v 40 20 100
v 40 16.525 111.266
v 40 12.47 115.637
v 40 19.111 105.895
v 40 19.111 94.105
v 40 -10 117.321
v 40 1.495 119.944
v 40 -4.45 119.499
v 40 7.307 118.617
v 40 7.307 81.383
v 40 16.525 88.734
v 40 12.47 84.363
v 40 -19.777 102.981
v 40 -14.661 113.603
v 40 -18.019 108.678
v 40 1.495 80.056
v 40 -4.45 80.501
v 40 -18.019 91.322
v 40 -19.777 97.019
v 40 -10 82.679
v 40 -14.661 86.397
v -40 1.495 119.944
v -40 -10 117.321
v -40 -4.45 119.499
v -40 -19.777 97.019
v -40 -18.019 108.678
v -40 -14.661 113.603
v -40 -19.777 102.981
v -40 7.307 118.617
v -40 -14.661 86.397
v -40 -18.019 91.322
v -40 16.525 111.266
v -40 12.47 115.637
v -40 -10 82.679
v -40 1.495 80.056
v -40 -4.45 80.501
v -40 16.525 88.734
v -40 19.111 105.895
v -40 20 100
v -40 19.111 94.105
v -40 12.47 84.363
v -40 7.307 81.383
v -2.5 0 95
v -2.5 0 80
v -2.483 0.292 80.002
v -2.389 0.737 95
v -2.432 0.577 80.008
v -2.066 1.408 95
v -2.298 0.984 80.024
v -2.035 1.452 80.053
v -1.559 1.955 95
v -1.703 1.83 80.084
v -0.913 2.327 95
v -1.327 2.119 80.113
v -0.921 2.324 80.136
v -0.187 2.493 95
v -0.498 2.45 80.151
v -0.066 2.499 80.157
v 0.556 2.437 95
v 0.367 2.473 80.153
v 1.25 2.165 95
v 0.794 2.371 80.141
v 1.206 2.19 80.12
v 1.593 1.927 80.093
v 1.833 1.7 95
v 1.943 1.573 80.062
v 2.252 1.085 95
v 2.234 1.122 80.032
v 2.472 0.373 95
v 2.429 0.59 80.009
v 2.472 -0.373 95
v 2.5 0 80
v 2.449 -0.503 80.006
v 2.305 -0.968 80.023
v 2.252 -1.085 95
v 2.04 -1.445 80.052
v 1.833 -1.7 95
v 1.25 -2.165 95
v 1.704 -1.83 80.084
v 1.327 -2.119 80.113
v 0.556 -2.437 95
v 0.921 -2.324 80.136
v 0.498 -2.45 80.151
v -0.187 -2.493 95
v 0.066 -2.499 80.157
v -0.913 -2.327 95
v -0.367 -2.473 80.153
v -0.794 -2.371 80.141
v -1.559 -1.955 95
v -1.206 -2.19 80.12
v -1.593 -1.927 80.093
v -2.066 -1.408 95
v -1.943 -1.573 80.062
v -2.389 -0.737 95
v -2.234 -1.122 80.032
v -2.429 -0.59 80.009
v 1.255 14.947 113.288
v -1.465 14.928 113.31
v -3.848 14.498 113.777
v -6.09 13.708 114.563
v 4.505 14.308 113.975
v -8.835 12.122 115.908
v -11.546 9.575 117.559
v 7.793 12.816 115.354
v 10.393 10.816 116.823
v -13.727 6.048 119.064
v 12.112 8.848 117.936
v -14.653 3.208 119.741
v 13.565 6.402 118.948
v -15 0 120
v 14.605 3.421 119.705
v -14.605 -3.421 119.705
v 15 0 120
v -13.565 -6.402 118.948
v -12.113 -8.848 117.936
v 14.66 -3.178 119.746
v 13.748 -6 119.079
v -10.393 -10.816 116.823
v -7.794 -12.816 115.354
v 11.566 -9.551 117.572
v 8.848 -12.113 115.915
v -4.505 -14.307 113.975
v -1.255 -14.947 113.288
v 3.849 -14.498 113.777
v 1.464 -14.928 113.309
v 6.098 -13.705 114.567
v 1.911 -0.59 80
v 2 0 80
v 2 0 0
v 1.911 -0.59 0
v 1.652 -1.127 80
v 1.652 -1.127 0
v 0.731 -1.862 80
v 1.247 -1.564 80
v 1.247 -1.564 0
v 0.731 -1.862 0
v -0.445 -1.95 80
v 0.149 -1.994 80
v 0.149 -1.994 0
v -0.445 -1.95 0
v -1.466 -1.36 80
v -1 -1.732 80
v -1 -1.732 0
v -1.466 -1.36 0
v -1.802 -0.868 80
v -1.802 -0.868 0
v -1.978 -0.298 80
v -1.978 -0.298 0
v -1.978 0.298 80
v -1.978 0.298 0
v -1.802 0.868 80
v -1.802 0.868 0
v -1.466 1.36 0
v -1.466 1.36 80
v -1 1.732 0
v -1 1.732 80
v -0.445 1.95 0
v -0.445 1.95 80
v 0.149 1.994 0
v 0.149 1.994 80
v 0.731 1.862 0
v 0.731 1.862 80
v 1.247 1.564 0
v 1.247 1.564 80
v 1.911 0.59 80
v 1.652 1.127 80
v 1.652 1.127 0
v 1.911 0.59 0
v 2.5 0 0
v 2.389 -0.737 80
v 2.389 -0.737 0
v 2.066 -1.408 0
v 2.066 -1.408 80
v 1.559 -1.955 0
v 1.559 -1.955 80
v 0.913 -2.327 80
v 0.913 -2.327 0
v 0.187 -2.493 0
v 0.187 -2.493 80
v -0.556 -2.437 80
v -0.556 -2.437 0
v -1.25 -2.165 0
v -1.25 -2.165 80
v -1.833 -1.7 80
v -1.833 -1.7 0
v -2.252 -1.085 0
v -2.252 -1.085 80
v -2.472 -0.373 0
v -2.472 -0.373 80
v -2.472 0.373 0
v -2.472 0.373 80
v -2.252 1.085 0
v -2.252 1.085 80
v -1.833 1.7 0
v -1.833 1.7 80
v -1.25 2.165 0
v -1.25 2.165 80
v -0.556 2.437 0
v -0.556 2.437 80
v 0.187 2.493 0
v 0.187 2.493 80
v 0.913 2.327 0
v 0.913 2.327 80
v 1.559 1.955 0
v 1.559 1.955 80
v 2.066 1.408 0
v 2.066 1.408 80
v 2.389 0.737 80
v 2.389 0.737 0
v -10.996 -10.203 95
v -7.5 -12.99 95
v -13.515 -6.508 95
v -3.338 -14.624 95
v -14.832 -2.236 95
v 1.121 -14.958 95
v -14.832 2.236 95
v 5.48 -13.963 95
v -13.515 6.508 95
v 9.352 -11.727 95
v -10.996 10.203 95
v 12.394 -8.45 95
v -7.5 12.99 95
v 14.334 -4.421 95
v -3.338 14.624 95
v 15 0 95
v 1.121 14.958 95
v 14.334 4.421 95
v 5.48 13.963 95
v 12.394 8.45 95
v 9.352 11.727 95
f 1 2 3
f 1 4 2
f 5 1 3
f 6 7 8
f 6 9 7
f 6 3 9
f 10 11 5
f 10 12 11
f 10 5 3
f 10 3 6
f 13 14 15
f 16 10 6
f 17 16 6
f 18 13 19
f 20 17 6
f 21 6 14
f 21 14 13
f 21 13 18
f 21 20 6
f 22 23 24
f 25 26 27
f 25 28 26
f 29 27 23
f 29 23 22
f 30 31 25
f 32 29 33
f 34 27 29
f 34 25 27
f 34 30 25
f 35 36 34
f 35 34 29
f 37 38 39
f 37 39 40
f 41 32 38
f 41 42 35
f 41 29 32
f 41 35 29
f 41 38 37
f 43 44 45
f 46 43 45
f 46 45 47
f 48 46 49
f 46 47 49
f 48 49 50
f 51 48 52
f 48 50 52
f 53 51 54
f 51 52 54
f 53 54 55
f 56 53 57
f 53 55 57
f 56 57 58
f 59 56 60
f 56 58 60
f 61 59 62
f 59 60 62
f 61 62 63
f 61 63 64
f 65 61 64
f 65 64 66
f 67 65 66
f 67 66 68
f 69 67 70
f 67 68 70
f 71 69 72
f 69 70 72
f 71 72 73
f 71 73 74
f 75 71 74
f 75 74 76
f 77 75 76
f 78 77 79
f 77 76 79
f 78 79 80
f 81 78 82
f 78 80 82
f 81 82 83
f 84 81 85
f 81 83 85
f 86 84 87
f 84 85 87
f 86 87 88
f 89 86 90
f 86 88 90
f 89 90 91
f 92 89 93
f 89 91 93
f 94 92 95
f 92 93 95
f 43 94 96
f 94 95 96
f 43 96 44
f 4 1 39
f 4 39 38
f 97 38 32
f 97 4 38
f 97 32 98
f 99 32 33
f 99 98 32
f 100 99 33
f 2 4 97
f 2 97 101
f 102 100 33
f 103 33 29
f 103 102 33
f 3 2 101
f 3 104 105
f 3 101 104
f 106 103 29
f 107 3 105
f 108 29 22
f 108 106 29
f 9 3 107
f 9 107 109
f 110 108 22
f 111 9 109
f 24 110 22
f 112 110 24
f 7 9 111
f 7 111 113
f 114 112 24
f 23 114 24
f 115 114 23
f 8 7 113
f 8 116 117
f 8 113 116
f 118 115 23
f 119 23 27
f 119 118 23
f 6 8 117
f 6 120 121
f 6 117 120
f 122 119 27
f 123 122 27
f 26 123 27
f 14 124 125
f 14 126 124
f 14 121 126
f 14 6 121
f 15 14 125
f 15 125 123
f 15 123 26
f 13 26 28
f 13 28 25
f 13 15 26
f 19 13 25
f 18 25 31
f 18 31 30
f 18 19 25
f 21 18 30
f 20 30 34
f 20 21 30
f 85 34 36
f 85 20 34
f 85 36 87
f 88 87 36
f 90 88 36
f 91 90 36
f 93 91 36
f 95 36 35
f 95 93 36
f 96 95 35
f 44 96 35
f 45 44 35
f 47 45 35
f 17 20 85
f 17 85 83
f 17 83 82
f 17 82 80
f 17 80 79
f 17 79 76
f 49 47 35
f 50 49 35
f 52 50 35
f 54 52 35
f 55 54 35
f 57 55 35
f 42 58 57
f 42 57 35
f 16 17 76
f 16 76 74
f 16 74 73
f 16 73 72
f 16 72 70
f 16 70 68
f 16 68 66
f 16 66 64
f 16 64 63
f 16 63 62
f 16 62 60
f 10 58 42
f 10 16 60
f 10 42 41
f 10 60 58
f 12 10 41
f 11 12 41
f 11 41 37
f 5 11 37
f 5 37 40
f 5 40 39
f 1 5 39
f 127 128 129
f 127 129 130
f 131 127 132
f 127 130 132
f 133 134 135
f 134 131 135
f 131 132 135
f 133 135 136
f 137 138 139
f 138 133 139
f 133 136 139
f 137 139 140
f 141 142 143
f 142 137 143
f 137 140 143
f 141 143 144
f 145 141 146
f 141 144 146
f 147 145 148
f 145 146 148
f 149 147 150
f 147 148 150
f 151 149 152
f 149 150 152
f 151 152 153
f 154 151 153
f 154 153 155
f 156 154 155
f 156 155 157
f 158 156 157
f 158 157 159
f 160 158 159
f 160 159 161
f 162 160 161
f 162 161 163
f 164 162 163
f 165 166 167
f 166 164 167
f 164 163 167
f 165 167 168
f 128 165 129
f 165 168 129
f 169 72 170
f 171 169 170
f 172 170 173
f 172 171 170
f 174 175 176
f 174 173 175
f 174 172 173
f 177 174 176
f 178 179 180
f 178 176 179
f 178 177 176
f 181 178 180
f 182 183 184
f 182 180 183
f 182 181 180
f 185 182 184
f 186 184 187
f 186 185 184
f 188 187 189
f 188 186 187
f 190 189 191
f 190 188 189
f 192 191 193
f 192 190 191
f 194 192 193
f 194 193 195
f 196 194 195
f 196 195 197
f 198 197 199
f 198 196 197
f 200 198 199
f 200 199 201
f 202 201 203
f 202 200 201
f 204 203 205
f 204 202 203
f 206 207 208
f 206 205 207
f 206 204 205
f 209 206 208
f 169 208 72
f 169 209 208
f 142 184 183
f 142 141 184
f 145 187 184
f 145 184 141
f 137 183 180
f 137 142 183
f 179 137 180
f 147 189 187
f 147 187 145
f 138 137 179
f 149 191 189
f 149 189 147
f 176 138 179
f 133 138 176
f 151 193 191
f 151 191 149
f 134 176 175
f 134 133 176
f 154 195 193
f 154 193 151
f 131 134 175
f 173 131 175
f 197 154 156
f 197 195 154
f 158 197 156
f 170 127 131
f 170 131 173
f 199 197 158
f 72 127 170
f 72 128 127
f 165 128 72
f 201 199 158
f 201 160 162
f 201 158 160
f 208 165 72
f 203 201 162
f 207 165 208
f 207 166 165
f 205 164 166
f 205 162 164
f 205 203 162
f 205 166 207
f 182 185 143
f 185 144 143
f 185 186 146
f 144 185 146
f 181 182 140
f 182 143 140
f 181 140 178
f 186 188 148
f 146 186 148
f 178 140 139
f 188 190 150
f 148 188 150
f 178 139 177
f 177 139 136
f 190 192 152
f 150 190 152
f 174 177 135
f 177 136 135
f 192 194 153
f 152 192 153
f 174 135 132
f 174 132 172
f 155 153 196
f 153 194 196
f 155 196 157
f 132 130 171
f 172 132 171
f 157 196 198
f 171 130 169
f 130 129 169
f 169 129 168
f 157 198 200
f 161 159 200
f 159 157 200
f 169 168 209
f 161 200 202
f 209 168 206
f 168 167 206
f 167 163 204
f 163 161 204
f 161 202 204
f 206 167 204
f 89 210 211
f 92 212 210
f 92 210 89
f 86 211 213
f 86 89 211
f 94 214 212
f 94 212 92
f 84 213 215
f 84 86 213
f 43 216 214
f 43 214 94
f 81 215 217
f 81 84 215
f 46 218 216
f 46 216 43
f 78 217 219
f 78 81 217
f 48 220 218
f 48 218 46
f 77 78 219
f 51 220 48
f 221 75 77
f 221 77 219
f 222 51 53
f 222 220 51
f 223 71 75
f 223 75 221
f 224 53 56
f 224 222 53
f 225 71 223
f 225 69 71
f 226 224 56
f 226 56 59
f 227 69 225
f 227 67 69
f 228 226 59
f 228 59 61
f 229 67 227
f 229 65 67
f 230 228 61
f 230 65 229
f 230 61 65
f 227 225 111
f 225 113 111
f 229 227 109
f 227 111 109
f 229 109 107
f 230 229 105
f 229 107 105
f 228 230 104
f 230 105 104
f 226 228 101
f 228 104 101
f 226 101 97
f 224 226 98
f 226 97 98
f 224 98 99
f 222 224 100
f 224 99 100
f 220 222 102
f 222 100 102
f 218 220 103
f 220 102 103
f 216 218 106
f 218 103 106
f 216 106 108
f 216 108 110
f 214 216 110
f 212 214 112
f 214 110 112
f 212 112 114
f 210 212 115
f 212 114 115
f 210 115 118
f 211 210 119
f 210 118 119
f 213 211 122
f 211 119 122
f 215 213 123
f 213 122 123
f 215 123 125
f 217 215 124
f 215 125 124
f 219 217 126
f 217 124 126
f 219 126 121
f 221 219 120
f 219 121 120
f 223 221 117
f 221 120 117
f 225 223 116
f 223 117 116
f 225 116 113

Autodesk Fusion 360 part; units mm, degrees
sketch "Sketch3" plane through (0, 0, 0) normal (0, 0, 1) x (1, 0, 0)
  circle A0 centre (0, 0) radius 2.5
  circle A1 centre (0, 0) radius 2
  dimension "d8" = 5
  dimension "d9" = 4
extrude "Extrude1" add sketch "Sketch3" along normal blind 80 makes body 1
ref_plane "WorkPlane1" through (0, 0, 80) normal (0, 0, 1) x (1, 0, 0)
sketch "Sketch4" plane through (0, 0, 80) normal (0, 0, 1) x (1, 0, 0)
sketch "Sketch5" plane through (0, 0, 80) normal (0, 0, 1) x (-1, 0, 0)
  circle A0 centre (0, 0) radius 2
  circle A1 centre (0, 0) radius 2.5
  line L0 (-40, 20) -> (40, 20)
  line L1 (40, 20) -> (40, -20)
  line L2 (40, -20) -> (-40, -20)
  line L3 (-40, -20) -> (-40, 20)
  line L4 (-40, 20) -> (40, -20) construction
  line L5 (40, 20) -> (-40, -20) construction
  dimension "d13" = 80
extrude "Extrude2" add sketch "Sketch5" along normal blind 40 separate body contours L0 L1 L2 L3 makes body 2
ref_plane "WorkPlane2" through (0, 0, 120) normal (0, 0, 1) x (-1, 0, 0)
sketch "Sketch6" plane through (0, 0, 120) normal (0, 0, 1) x (1, 0, 0)
ref_plane "WorkPlane3" through (40, 0, 100) normal (1, 0, 0) x (0, 1, 0)
sketch "Sketch7" plane through (40, 0, 100) normal (1, 0, 0) x (0, 1, 0)
  circle A0 centre (0, 0) radius 20
  line L0 (20, 20) -> (-20, 20)
  line L1 (-20, 20) -> (-20, -20)
  line L2 (-20, -20) -> (20, -20)
  line L3 (20, -20) -> (20, 20)
  line L4 (20, 20) -> (-20, -20) construction
  line L5 (-20, 20) -> (20, -20) construction
  dimension "d18" = 40
  dimension "d19" = 40
extrude "Extrude4" cut sketch "Sketch7" against normal blind 80 contours A0 L2 L3 | A0 L0 L3 | A0 L0 L1 | A0 L1 L2 bodies 2
extrude "Extrude3" cut sketch "Sketch7" against normal blind 80 contours A0 L0 L1 bodies 2
sketch "Sketch8" plane through (40, 0, 0) normal (1, 0, 0) x (0, 1, 0)
  circle A0 centre (0, 100) radius 20
ref_plane "WorkPlane4" through (0, 0, 120) normal (0, 0, 1) x (1, 0, 0)
sketch "Sketch9" plane through (0, 0, 120) normal (0, 0, 1) x (1, 0, 0)
  circle A0 centre (0, 0) radius 15
  dimension "d25" = 30
extrude "Extrude5" cut sketch "Sketch9" against normal blind 25 bodies 2
